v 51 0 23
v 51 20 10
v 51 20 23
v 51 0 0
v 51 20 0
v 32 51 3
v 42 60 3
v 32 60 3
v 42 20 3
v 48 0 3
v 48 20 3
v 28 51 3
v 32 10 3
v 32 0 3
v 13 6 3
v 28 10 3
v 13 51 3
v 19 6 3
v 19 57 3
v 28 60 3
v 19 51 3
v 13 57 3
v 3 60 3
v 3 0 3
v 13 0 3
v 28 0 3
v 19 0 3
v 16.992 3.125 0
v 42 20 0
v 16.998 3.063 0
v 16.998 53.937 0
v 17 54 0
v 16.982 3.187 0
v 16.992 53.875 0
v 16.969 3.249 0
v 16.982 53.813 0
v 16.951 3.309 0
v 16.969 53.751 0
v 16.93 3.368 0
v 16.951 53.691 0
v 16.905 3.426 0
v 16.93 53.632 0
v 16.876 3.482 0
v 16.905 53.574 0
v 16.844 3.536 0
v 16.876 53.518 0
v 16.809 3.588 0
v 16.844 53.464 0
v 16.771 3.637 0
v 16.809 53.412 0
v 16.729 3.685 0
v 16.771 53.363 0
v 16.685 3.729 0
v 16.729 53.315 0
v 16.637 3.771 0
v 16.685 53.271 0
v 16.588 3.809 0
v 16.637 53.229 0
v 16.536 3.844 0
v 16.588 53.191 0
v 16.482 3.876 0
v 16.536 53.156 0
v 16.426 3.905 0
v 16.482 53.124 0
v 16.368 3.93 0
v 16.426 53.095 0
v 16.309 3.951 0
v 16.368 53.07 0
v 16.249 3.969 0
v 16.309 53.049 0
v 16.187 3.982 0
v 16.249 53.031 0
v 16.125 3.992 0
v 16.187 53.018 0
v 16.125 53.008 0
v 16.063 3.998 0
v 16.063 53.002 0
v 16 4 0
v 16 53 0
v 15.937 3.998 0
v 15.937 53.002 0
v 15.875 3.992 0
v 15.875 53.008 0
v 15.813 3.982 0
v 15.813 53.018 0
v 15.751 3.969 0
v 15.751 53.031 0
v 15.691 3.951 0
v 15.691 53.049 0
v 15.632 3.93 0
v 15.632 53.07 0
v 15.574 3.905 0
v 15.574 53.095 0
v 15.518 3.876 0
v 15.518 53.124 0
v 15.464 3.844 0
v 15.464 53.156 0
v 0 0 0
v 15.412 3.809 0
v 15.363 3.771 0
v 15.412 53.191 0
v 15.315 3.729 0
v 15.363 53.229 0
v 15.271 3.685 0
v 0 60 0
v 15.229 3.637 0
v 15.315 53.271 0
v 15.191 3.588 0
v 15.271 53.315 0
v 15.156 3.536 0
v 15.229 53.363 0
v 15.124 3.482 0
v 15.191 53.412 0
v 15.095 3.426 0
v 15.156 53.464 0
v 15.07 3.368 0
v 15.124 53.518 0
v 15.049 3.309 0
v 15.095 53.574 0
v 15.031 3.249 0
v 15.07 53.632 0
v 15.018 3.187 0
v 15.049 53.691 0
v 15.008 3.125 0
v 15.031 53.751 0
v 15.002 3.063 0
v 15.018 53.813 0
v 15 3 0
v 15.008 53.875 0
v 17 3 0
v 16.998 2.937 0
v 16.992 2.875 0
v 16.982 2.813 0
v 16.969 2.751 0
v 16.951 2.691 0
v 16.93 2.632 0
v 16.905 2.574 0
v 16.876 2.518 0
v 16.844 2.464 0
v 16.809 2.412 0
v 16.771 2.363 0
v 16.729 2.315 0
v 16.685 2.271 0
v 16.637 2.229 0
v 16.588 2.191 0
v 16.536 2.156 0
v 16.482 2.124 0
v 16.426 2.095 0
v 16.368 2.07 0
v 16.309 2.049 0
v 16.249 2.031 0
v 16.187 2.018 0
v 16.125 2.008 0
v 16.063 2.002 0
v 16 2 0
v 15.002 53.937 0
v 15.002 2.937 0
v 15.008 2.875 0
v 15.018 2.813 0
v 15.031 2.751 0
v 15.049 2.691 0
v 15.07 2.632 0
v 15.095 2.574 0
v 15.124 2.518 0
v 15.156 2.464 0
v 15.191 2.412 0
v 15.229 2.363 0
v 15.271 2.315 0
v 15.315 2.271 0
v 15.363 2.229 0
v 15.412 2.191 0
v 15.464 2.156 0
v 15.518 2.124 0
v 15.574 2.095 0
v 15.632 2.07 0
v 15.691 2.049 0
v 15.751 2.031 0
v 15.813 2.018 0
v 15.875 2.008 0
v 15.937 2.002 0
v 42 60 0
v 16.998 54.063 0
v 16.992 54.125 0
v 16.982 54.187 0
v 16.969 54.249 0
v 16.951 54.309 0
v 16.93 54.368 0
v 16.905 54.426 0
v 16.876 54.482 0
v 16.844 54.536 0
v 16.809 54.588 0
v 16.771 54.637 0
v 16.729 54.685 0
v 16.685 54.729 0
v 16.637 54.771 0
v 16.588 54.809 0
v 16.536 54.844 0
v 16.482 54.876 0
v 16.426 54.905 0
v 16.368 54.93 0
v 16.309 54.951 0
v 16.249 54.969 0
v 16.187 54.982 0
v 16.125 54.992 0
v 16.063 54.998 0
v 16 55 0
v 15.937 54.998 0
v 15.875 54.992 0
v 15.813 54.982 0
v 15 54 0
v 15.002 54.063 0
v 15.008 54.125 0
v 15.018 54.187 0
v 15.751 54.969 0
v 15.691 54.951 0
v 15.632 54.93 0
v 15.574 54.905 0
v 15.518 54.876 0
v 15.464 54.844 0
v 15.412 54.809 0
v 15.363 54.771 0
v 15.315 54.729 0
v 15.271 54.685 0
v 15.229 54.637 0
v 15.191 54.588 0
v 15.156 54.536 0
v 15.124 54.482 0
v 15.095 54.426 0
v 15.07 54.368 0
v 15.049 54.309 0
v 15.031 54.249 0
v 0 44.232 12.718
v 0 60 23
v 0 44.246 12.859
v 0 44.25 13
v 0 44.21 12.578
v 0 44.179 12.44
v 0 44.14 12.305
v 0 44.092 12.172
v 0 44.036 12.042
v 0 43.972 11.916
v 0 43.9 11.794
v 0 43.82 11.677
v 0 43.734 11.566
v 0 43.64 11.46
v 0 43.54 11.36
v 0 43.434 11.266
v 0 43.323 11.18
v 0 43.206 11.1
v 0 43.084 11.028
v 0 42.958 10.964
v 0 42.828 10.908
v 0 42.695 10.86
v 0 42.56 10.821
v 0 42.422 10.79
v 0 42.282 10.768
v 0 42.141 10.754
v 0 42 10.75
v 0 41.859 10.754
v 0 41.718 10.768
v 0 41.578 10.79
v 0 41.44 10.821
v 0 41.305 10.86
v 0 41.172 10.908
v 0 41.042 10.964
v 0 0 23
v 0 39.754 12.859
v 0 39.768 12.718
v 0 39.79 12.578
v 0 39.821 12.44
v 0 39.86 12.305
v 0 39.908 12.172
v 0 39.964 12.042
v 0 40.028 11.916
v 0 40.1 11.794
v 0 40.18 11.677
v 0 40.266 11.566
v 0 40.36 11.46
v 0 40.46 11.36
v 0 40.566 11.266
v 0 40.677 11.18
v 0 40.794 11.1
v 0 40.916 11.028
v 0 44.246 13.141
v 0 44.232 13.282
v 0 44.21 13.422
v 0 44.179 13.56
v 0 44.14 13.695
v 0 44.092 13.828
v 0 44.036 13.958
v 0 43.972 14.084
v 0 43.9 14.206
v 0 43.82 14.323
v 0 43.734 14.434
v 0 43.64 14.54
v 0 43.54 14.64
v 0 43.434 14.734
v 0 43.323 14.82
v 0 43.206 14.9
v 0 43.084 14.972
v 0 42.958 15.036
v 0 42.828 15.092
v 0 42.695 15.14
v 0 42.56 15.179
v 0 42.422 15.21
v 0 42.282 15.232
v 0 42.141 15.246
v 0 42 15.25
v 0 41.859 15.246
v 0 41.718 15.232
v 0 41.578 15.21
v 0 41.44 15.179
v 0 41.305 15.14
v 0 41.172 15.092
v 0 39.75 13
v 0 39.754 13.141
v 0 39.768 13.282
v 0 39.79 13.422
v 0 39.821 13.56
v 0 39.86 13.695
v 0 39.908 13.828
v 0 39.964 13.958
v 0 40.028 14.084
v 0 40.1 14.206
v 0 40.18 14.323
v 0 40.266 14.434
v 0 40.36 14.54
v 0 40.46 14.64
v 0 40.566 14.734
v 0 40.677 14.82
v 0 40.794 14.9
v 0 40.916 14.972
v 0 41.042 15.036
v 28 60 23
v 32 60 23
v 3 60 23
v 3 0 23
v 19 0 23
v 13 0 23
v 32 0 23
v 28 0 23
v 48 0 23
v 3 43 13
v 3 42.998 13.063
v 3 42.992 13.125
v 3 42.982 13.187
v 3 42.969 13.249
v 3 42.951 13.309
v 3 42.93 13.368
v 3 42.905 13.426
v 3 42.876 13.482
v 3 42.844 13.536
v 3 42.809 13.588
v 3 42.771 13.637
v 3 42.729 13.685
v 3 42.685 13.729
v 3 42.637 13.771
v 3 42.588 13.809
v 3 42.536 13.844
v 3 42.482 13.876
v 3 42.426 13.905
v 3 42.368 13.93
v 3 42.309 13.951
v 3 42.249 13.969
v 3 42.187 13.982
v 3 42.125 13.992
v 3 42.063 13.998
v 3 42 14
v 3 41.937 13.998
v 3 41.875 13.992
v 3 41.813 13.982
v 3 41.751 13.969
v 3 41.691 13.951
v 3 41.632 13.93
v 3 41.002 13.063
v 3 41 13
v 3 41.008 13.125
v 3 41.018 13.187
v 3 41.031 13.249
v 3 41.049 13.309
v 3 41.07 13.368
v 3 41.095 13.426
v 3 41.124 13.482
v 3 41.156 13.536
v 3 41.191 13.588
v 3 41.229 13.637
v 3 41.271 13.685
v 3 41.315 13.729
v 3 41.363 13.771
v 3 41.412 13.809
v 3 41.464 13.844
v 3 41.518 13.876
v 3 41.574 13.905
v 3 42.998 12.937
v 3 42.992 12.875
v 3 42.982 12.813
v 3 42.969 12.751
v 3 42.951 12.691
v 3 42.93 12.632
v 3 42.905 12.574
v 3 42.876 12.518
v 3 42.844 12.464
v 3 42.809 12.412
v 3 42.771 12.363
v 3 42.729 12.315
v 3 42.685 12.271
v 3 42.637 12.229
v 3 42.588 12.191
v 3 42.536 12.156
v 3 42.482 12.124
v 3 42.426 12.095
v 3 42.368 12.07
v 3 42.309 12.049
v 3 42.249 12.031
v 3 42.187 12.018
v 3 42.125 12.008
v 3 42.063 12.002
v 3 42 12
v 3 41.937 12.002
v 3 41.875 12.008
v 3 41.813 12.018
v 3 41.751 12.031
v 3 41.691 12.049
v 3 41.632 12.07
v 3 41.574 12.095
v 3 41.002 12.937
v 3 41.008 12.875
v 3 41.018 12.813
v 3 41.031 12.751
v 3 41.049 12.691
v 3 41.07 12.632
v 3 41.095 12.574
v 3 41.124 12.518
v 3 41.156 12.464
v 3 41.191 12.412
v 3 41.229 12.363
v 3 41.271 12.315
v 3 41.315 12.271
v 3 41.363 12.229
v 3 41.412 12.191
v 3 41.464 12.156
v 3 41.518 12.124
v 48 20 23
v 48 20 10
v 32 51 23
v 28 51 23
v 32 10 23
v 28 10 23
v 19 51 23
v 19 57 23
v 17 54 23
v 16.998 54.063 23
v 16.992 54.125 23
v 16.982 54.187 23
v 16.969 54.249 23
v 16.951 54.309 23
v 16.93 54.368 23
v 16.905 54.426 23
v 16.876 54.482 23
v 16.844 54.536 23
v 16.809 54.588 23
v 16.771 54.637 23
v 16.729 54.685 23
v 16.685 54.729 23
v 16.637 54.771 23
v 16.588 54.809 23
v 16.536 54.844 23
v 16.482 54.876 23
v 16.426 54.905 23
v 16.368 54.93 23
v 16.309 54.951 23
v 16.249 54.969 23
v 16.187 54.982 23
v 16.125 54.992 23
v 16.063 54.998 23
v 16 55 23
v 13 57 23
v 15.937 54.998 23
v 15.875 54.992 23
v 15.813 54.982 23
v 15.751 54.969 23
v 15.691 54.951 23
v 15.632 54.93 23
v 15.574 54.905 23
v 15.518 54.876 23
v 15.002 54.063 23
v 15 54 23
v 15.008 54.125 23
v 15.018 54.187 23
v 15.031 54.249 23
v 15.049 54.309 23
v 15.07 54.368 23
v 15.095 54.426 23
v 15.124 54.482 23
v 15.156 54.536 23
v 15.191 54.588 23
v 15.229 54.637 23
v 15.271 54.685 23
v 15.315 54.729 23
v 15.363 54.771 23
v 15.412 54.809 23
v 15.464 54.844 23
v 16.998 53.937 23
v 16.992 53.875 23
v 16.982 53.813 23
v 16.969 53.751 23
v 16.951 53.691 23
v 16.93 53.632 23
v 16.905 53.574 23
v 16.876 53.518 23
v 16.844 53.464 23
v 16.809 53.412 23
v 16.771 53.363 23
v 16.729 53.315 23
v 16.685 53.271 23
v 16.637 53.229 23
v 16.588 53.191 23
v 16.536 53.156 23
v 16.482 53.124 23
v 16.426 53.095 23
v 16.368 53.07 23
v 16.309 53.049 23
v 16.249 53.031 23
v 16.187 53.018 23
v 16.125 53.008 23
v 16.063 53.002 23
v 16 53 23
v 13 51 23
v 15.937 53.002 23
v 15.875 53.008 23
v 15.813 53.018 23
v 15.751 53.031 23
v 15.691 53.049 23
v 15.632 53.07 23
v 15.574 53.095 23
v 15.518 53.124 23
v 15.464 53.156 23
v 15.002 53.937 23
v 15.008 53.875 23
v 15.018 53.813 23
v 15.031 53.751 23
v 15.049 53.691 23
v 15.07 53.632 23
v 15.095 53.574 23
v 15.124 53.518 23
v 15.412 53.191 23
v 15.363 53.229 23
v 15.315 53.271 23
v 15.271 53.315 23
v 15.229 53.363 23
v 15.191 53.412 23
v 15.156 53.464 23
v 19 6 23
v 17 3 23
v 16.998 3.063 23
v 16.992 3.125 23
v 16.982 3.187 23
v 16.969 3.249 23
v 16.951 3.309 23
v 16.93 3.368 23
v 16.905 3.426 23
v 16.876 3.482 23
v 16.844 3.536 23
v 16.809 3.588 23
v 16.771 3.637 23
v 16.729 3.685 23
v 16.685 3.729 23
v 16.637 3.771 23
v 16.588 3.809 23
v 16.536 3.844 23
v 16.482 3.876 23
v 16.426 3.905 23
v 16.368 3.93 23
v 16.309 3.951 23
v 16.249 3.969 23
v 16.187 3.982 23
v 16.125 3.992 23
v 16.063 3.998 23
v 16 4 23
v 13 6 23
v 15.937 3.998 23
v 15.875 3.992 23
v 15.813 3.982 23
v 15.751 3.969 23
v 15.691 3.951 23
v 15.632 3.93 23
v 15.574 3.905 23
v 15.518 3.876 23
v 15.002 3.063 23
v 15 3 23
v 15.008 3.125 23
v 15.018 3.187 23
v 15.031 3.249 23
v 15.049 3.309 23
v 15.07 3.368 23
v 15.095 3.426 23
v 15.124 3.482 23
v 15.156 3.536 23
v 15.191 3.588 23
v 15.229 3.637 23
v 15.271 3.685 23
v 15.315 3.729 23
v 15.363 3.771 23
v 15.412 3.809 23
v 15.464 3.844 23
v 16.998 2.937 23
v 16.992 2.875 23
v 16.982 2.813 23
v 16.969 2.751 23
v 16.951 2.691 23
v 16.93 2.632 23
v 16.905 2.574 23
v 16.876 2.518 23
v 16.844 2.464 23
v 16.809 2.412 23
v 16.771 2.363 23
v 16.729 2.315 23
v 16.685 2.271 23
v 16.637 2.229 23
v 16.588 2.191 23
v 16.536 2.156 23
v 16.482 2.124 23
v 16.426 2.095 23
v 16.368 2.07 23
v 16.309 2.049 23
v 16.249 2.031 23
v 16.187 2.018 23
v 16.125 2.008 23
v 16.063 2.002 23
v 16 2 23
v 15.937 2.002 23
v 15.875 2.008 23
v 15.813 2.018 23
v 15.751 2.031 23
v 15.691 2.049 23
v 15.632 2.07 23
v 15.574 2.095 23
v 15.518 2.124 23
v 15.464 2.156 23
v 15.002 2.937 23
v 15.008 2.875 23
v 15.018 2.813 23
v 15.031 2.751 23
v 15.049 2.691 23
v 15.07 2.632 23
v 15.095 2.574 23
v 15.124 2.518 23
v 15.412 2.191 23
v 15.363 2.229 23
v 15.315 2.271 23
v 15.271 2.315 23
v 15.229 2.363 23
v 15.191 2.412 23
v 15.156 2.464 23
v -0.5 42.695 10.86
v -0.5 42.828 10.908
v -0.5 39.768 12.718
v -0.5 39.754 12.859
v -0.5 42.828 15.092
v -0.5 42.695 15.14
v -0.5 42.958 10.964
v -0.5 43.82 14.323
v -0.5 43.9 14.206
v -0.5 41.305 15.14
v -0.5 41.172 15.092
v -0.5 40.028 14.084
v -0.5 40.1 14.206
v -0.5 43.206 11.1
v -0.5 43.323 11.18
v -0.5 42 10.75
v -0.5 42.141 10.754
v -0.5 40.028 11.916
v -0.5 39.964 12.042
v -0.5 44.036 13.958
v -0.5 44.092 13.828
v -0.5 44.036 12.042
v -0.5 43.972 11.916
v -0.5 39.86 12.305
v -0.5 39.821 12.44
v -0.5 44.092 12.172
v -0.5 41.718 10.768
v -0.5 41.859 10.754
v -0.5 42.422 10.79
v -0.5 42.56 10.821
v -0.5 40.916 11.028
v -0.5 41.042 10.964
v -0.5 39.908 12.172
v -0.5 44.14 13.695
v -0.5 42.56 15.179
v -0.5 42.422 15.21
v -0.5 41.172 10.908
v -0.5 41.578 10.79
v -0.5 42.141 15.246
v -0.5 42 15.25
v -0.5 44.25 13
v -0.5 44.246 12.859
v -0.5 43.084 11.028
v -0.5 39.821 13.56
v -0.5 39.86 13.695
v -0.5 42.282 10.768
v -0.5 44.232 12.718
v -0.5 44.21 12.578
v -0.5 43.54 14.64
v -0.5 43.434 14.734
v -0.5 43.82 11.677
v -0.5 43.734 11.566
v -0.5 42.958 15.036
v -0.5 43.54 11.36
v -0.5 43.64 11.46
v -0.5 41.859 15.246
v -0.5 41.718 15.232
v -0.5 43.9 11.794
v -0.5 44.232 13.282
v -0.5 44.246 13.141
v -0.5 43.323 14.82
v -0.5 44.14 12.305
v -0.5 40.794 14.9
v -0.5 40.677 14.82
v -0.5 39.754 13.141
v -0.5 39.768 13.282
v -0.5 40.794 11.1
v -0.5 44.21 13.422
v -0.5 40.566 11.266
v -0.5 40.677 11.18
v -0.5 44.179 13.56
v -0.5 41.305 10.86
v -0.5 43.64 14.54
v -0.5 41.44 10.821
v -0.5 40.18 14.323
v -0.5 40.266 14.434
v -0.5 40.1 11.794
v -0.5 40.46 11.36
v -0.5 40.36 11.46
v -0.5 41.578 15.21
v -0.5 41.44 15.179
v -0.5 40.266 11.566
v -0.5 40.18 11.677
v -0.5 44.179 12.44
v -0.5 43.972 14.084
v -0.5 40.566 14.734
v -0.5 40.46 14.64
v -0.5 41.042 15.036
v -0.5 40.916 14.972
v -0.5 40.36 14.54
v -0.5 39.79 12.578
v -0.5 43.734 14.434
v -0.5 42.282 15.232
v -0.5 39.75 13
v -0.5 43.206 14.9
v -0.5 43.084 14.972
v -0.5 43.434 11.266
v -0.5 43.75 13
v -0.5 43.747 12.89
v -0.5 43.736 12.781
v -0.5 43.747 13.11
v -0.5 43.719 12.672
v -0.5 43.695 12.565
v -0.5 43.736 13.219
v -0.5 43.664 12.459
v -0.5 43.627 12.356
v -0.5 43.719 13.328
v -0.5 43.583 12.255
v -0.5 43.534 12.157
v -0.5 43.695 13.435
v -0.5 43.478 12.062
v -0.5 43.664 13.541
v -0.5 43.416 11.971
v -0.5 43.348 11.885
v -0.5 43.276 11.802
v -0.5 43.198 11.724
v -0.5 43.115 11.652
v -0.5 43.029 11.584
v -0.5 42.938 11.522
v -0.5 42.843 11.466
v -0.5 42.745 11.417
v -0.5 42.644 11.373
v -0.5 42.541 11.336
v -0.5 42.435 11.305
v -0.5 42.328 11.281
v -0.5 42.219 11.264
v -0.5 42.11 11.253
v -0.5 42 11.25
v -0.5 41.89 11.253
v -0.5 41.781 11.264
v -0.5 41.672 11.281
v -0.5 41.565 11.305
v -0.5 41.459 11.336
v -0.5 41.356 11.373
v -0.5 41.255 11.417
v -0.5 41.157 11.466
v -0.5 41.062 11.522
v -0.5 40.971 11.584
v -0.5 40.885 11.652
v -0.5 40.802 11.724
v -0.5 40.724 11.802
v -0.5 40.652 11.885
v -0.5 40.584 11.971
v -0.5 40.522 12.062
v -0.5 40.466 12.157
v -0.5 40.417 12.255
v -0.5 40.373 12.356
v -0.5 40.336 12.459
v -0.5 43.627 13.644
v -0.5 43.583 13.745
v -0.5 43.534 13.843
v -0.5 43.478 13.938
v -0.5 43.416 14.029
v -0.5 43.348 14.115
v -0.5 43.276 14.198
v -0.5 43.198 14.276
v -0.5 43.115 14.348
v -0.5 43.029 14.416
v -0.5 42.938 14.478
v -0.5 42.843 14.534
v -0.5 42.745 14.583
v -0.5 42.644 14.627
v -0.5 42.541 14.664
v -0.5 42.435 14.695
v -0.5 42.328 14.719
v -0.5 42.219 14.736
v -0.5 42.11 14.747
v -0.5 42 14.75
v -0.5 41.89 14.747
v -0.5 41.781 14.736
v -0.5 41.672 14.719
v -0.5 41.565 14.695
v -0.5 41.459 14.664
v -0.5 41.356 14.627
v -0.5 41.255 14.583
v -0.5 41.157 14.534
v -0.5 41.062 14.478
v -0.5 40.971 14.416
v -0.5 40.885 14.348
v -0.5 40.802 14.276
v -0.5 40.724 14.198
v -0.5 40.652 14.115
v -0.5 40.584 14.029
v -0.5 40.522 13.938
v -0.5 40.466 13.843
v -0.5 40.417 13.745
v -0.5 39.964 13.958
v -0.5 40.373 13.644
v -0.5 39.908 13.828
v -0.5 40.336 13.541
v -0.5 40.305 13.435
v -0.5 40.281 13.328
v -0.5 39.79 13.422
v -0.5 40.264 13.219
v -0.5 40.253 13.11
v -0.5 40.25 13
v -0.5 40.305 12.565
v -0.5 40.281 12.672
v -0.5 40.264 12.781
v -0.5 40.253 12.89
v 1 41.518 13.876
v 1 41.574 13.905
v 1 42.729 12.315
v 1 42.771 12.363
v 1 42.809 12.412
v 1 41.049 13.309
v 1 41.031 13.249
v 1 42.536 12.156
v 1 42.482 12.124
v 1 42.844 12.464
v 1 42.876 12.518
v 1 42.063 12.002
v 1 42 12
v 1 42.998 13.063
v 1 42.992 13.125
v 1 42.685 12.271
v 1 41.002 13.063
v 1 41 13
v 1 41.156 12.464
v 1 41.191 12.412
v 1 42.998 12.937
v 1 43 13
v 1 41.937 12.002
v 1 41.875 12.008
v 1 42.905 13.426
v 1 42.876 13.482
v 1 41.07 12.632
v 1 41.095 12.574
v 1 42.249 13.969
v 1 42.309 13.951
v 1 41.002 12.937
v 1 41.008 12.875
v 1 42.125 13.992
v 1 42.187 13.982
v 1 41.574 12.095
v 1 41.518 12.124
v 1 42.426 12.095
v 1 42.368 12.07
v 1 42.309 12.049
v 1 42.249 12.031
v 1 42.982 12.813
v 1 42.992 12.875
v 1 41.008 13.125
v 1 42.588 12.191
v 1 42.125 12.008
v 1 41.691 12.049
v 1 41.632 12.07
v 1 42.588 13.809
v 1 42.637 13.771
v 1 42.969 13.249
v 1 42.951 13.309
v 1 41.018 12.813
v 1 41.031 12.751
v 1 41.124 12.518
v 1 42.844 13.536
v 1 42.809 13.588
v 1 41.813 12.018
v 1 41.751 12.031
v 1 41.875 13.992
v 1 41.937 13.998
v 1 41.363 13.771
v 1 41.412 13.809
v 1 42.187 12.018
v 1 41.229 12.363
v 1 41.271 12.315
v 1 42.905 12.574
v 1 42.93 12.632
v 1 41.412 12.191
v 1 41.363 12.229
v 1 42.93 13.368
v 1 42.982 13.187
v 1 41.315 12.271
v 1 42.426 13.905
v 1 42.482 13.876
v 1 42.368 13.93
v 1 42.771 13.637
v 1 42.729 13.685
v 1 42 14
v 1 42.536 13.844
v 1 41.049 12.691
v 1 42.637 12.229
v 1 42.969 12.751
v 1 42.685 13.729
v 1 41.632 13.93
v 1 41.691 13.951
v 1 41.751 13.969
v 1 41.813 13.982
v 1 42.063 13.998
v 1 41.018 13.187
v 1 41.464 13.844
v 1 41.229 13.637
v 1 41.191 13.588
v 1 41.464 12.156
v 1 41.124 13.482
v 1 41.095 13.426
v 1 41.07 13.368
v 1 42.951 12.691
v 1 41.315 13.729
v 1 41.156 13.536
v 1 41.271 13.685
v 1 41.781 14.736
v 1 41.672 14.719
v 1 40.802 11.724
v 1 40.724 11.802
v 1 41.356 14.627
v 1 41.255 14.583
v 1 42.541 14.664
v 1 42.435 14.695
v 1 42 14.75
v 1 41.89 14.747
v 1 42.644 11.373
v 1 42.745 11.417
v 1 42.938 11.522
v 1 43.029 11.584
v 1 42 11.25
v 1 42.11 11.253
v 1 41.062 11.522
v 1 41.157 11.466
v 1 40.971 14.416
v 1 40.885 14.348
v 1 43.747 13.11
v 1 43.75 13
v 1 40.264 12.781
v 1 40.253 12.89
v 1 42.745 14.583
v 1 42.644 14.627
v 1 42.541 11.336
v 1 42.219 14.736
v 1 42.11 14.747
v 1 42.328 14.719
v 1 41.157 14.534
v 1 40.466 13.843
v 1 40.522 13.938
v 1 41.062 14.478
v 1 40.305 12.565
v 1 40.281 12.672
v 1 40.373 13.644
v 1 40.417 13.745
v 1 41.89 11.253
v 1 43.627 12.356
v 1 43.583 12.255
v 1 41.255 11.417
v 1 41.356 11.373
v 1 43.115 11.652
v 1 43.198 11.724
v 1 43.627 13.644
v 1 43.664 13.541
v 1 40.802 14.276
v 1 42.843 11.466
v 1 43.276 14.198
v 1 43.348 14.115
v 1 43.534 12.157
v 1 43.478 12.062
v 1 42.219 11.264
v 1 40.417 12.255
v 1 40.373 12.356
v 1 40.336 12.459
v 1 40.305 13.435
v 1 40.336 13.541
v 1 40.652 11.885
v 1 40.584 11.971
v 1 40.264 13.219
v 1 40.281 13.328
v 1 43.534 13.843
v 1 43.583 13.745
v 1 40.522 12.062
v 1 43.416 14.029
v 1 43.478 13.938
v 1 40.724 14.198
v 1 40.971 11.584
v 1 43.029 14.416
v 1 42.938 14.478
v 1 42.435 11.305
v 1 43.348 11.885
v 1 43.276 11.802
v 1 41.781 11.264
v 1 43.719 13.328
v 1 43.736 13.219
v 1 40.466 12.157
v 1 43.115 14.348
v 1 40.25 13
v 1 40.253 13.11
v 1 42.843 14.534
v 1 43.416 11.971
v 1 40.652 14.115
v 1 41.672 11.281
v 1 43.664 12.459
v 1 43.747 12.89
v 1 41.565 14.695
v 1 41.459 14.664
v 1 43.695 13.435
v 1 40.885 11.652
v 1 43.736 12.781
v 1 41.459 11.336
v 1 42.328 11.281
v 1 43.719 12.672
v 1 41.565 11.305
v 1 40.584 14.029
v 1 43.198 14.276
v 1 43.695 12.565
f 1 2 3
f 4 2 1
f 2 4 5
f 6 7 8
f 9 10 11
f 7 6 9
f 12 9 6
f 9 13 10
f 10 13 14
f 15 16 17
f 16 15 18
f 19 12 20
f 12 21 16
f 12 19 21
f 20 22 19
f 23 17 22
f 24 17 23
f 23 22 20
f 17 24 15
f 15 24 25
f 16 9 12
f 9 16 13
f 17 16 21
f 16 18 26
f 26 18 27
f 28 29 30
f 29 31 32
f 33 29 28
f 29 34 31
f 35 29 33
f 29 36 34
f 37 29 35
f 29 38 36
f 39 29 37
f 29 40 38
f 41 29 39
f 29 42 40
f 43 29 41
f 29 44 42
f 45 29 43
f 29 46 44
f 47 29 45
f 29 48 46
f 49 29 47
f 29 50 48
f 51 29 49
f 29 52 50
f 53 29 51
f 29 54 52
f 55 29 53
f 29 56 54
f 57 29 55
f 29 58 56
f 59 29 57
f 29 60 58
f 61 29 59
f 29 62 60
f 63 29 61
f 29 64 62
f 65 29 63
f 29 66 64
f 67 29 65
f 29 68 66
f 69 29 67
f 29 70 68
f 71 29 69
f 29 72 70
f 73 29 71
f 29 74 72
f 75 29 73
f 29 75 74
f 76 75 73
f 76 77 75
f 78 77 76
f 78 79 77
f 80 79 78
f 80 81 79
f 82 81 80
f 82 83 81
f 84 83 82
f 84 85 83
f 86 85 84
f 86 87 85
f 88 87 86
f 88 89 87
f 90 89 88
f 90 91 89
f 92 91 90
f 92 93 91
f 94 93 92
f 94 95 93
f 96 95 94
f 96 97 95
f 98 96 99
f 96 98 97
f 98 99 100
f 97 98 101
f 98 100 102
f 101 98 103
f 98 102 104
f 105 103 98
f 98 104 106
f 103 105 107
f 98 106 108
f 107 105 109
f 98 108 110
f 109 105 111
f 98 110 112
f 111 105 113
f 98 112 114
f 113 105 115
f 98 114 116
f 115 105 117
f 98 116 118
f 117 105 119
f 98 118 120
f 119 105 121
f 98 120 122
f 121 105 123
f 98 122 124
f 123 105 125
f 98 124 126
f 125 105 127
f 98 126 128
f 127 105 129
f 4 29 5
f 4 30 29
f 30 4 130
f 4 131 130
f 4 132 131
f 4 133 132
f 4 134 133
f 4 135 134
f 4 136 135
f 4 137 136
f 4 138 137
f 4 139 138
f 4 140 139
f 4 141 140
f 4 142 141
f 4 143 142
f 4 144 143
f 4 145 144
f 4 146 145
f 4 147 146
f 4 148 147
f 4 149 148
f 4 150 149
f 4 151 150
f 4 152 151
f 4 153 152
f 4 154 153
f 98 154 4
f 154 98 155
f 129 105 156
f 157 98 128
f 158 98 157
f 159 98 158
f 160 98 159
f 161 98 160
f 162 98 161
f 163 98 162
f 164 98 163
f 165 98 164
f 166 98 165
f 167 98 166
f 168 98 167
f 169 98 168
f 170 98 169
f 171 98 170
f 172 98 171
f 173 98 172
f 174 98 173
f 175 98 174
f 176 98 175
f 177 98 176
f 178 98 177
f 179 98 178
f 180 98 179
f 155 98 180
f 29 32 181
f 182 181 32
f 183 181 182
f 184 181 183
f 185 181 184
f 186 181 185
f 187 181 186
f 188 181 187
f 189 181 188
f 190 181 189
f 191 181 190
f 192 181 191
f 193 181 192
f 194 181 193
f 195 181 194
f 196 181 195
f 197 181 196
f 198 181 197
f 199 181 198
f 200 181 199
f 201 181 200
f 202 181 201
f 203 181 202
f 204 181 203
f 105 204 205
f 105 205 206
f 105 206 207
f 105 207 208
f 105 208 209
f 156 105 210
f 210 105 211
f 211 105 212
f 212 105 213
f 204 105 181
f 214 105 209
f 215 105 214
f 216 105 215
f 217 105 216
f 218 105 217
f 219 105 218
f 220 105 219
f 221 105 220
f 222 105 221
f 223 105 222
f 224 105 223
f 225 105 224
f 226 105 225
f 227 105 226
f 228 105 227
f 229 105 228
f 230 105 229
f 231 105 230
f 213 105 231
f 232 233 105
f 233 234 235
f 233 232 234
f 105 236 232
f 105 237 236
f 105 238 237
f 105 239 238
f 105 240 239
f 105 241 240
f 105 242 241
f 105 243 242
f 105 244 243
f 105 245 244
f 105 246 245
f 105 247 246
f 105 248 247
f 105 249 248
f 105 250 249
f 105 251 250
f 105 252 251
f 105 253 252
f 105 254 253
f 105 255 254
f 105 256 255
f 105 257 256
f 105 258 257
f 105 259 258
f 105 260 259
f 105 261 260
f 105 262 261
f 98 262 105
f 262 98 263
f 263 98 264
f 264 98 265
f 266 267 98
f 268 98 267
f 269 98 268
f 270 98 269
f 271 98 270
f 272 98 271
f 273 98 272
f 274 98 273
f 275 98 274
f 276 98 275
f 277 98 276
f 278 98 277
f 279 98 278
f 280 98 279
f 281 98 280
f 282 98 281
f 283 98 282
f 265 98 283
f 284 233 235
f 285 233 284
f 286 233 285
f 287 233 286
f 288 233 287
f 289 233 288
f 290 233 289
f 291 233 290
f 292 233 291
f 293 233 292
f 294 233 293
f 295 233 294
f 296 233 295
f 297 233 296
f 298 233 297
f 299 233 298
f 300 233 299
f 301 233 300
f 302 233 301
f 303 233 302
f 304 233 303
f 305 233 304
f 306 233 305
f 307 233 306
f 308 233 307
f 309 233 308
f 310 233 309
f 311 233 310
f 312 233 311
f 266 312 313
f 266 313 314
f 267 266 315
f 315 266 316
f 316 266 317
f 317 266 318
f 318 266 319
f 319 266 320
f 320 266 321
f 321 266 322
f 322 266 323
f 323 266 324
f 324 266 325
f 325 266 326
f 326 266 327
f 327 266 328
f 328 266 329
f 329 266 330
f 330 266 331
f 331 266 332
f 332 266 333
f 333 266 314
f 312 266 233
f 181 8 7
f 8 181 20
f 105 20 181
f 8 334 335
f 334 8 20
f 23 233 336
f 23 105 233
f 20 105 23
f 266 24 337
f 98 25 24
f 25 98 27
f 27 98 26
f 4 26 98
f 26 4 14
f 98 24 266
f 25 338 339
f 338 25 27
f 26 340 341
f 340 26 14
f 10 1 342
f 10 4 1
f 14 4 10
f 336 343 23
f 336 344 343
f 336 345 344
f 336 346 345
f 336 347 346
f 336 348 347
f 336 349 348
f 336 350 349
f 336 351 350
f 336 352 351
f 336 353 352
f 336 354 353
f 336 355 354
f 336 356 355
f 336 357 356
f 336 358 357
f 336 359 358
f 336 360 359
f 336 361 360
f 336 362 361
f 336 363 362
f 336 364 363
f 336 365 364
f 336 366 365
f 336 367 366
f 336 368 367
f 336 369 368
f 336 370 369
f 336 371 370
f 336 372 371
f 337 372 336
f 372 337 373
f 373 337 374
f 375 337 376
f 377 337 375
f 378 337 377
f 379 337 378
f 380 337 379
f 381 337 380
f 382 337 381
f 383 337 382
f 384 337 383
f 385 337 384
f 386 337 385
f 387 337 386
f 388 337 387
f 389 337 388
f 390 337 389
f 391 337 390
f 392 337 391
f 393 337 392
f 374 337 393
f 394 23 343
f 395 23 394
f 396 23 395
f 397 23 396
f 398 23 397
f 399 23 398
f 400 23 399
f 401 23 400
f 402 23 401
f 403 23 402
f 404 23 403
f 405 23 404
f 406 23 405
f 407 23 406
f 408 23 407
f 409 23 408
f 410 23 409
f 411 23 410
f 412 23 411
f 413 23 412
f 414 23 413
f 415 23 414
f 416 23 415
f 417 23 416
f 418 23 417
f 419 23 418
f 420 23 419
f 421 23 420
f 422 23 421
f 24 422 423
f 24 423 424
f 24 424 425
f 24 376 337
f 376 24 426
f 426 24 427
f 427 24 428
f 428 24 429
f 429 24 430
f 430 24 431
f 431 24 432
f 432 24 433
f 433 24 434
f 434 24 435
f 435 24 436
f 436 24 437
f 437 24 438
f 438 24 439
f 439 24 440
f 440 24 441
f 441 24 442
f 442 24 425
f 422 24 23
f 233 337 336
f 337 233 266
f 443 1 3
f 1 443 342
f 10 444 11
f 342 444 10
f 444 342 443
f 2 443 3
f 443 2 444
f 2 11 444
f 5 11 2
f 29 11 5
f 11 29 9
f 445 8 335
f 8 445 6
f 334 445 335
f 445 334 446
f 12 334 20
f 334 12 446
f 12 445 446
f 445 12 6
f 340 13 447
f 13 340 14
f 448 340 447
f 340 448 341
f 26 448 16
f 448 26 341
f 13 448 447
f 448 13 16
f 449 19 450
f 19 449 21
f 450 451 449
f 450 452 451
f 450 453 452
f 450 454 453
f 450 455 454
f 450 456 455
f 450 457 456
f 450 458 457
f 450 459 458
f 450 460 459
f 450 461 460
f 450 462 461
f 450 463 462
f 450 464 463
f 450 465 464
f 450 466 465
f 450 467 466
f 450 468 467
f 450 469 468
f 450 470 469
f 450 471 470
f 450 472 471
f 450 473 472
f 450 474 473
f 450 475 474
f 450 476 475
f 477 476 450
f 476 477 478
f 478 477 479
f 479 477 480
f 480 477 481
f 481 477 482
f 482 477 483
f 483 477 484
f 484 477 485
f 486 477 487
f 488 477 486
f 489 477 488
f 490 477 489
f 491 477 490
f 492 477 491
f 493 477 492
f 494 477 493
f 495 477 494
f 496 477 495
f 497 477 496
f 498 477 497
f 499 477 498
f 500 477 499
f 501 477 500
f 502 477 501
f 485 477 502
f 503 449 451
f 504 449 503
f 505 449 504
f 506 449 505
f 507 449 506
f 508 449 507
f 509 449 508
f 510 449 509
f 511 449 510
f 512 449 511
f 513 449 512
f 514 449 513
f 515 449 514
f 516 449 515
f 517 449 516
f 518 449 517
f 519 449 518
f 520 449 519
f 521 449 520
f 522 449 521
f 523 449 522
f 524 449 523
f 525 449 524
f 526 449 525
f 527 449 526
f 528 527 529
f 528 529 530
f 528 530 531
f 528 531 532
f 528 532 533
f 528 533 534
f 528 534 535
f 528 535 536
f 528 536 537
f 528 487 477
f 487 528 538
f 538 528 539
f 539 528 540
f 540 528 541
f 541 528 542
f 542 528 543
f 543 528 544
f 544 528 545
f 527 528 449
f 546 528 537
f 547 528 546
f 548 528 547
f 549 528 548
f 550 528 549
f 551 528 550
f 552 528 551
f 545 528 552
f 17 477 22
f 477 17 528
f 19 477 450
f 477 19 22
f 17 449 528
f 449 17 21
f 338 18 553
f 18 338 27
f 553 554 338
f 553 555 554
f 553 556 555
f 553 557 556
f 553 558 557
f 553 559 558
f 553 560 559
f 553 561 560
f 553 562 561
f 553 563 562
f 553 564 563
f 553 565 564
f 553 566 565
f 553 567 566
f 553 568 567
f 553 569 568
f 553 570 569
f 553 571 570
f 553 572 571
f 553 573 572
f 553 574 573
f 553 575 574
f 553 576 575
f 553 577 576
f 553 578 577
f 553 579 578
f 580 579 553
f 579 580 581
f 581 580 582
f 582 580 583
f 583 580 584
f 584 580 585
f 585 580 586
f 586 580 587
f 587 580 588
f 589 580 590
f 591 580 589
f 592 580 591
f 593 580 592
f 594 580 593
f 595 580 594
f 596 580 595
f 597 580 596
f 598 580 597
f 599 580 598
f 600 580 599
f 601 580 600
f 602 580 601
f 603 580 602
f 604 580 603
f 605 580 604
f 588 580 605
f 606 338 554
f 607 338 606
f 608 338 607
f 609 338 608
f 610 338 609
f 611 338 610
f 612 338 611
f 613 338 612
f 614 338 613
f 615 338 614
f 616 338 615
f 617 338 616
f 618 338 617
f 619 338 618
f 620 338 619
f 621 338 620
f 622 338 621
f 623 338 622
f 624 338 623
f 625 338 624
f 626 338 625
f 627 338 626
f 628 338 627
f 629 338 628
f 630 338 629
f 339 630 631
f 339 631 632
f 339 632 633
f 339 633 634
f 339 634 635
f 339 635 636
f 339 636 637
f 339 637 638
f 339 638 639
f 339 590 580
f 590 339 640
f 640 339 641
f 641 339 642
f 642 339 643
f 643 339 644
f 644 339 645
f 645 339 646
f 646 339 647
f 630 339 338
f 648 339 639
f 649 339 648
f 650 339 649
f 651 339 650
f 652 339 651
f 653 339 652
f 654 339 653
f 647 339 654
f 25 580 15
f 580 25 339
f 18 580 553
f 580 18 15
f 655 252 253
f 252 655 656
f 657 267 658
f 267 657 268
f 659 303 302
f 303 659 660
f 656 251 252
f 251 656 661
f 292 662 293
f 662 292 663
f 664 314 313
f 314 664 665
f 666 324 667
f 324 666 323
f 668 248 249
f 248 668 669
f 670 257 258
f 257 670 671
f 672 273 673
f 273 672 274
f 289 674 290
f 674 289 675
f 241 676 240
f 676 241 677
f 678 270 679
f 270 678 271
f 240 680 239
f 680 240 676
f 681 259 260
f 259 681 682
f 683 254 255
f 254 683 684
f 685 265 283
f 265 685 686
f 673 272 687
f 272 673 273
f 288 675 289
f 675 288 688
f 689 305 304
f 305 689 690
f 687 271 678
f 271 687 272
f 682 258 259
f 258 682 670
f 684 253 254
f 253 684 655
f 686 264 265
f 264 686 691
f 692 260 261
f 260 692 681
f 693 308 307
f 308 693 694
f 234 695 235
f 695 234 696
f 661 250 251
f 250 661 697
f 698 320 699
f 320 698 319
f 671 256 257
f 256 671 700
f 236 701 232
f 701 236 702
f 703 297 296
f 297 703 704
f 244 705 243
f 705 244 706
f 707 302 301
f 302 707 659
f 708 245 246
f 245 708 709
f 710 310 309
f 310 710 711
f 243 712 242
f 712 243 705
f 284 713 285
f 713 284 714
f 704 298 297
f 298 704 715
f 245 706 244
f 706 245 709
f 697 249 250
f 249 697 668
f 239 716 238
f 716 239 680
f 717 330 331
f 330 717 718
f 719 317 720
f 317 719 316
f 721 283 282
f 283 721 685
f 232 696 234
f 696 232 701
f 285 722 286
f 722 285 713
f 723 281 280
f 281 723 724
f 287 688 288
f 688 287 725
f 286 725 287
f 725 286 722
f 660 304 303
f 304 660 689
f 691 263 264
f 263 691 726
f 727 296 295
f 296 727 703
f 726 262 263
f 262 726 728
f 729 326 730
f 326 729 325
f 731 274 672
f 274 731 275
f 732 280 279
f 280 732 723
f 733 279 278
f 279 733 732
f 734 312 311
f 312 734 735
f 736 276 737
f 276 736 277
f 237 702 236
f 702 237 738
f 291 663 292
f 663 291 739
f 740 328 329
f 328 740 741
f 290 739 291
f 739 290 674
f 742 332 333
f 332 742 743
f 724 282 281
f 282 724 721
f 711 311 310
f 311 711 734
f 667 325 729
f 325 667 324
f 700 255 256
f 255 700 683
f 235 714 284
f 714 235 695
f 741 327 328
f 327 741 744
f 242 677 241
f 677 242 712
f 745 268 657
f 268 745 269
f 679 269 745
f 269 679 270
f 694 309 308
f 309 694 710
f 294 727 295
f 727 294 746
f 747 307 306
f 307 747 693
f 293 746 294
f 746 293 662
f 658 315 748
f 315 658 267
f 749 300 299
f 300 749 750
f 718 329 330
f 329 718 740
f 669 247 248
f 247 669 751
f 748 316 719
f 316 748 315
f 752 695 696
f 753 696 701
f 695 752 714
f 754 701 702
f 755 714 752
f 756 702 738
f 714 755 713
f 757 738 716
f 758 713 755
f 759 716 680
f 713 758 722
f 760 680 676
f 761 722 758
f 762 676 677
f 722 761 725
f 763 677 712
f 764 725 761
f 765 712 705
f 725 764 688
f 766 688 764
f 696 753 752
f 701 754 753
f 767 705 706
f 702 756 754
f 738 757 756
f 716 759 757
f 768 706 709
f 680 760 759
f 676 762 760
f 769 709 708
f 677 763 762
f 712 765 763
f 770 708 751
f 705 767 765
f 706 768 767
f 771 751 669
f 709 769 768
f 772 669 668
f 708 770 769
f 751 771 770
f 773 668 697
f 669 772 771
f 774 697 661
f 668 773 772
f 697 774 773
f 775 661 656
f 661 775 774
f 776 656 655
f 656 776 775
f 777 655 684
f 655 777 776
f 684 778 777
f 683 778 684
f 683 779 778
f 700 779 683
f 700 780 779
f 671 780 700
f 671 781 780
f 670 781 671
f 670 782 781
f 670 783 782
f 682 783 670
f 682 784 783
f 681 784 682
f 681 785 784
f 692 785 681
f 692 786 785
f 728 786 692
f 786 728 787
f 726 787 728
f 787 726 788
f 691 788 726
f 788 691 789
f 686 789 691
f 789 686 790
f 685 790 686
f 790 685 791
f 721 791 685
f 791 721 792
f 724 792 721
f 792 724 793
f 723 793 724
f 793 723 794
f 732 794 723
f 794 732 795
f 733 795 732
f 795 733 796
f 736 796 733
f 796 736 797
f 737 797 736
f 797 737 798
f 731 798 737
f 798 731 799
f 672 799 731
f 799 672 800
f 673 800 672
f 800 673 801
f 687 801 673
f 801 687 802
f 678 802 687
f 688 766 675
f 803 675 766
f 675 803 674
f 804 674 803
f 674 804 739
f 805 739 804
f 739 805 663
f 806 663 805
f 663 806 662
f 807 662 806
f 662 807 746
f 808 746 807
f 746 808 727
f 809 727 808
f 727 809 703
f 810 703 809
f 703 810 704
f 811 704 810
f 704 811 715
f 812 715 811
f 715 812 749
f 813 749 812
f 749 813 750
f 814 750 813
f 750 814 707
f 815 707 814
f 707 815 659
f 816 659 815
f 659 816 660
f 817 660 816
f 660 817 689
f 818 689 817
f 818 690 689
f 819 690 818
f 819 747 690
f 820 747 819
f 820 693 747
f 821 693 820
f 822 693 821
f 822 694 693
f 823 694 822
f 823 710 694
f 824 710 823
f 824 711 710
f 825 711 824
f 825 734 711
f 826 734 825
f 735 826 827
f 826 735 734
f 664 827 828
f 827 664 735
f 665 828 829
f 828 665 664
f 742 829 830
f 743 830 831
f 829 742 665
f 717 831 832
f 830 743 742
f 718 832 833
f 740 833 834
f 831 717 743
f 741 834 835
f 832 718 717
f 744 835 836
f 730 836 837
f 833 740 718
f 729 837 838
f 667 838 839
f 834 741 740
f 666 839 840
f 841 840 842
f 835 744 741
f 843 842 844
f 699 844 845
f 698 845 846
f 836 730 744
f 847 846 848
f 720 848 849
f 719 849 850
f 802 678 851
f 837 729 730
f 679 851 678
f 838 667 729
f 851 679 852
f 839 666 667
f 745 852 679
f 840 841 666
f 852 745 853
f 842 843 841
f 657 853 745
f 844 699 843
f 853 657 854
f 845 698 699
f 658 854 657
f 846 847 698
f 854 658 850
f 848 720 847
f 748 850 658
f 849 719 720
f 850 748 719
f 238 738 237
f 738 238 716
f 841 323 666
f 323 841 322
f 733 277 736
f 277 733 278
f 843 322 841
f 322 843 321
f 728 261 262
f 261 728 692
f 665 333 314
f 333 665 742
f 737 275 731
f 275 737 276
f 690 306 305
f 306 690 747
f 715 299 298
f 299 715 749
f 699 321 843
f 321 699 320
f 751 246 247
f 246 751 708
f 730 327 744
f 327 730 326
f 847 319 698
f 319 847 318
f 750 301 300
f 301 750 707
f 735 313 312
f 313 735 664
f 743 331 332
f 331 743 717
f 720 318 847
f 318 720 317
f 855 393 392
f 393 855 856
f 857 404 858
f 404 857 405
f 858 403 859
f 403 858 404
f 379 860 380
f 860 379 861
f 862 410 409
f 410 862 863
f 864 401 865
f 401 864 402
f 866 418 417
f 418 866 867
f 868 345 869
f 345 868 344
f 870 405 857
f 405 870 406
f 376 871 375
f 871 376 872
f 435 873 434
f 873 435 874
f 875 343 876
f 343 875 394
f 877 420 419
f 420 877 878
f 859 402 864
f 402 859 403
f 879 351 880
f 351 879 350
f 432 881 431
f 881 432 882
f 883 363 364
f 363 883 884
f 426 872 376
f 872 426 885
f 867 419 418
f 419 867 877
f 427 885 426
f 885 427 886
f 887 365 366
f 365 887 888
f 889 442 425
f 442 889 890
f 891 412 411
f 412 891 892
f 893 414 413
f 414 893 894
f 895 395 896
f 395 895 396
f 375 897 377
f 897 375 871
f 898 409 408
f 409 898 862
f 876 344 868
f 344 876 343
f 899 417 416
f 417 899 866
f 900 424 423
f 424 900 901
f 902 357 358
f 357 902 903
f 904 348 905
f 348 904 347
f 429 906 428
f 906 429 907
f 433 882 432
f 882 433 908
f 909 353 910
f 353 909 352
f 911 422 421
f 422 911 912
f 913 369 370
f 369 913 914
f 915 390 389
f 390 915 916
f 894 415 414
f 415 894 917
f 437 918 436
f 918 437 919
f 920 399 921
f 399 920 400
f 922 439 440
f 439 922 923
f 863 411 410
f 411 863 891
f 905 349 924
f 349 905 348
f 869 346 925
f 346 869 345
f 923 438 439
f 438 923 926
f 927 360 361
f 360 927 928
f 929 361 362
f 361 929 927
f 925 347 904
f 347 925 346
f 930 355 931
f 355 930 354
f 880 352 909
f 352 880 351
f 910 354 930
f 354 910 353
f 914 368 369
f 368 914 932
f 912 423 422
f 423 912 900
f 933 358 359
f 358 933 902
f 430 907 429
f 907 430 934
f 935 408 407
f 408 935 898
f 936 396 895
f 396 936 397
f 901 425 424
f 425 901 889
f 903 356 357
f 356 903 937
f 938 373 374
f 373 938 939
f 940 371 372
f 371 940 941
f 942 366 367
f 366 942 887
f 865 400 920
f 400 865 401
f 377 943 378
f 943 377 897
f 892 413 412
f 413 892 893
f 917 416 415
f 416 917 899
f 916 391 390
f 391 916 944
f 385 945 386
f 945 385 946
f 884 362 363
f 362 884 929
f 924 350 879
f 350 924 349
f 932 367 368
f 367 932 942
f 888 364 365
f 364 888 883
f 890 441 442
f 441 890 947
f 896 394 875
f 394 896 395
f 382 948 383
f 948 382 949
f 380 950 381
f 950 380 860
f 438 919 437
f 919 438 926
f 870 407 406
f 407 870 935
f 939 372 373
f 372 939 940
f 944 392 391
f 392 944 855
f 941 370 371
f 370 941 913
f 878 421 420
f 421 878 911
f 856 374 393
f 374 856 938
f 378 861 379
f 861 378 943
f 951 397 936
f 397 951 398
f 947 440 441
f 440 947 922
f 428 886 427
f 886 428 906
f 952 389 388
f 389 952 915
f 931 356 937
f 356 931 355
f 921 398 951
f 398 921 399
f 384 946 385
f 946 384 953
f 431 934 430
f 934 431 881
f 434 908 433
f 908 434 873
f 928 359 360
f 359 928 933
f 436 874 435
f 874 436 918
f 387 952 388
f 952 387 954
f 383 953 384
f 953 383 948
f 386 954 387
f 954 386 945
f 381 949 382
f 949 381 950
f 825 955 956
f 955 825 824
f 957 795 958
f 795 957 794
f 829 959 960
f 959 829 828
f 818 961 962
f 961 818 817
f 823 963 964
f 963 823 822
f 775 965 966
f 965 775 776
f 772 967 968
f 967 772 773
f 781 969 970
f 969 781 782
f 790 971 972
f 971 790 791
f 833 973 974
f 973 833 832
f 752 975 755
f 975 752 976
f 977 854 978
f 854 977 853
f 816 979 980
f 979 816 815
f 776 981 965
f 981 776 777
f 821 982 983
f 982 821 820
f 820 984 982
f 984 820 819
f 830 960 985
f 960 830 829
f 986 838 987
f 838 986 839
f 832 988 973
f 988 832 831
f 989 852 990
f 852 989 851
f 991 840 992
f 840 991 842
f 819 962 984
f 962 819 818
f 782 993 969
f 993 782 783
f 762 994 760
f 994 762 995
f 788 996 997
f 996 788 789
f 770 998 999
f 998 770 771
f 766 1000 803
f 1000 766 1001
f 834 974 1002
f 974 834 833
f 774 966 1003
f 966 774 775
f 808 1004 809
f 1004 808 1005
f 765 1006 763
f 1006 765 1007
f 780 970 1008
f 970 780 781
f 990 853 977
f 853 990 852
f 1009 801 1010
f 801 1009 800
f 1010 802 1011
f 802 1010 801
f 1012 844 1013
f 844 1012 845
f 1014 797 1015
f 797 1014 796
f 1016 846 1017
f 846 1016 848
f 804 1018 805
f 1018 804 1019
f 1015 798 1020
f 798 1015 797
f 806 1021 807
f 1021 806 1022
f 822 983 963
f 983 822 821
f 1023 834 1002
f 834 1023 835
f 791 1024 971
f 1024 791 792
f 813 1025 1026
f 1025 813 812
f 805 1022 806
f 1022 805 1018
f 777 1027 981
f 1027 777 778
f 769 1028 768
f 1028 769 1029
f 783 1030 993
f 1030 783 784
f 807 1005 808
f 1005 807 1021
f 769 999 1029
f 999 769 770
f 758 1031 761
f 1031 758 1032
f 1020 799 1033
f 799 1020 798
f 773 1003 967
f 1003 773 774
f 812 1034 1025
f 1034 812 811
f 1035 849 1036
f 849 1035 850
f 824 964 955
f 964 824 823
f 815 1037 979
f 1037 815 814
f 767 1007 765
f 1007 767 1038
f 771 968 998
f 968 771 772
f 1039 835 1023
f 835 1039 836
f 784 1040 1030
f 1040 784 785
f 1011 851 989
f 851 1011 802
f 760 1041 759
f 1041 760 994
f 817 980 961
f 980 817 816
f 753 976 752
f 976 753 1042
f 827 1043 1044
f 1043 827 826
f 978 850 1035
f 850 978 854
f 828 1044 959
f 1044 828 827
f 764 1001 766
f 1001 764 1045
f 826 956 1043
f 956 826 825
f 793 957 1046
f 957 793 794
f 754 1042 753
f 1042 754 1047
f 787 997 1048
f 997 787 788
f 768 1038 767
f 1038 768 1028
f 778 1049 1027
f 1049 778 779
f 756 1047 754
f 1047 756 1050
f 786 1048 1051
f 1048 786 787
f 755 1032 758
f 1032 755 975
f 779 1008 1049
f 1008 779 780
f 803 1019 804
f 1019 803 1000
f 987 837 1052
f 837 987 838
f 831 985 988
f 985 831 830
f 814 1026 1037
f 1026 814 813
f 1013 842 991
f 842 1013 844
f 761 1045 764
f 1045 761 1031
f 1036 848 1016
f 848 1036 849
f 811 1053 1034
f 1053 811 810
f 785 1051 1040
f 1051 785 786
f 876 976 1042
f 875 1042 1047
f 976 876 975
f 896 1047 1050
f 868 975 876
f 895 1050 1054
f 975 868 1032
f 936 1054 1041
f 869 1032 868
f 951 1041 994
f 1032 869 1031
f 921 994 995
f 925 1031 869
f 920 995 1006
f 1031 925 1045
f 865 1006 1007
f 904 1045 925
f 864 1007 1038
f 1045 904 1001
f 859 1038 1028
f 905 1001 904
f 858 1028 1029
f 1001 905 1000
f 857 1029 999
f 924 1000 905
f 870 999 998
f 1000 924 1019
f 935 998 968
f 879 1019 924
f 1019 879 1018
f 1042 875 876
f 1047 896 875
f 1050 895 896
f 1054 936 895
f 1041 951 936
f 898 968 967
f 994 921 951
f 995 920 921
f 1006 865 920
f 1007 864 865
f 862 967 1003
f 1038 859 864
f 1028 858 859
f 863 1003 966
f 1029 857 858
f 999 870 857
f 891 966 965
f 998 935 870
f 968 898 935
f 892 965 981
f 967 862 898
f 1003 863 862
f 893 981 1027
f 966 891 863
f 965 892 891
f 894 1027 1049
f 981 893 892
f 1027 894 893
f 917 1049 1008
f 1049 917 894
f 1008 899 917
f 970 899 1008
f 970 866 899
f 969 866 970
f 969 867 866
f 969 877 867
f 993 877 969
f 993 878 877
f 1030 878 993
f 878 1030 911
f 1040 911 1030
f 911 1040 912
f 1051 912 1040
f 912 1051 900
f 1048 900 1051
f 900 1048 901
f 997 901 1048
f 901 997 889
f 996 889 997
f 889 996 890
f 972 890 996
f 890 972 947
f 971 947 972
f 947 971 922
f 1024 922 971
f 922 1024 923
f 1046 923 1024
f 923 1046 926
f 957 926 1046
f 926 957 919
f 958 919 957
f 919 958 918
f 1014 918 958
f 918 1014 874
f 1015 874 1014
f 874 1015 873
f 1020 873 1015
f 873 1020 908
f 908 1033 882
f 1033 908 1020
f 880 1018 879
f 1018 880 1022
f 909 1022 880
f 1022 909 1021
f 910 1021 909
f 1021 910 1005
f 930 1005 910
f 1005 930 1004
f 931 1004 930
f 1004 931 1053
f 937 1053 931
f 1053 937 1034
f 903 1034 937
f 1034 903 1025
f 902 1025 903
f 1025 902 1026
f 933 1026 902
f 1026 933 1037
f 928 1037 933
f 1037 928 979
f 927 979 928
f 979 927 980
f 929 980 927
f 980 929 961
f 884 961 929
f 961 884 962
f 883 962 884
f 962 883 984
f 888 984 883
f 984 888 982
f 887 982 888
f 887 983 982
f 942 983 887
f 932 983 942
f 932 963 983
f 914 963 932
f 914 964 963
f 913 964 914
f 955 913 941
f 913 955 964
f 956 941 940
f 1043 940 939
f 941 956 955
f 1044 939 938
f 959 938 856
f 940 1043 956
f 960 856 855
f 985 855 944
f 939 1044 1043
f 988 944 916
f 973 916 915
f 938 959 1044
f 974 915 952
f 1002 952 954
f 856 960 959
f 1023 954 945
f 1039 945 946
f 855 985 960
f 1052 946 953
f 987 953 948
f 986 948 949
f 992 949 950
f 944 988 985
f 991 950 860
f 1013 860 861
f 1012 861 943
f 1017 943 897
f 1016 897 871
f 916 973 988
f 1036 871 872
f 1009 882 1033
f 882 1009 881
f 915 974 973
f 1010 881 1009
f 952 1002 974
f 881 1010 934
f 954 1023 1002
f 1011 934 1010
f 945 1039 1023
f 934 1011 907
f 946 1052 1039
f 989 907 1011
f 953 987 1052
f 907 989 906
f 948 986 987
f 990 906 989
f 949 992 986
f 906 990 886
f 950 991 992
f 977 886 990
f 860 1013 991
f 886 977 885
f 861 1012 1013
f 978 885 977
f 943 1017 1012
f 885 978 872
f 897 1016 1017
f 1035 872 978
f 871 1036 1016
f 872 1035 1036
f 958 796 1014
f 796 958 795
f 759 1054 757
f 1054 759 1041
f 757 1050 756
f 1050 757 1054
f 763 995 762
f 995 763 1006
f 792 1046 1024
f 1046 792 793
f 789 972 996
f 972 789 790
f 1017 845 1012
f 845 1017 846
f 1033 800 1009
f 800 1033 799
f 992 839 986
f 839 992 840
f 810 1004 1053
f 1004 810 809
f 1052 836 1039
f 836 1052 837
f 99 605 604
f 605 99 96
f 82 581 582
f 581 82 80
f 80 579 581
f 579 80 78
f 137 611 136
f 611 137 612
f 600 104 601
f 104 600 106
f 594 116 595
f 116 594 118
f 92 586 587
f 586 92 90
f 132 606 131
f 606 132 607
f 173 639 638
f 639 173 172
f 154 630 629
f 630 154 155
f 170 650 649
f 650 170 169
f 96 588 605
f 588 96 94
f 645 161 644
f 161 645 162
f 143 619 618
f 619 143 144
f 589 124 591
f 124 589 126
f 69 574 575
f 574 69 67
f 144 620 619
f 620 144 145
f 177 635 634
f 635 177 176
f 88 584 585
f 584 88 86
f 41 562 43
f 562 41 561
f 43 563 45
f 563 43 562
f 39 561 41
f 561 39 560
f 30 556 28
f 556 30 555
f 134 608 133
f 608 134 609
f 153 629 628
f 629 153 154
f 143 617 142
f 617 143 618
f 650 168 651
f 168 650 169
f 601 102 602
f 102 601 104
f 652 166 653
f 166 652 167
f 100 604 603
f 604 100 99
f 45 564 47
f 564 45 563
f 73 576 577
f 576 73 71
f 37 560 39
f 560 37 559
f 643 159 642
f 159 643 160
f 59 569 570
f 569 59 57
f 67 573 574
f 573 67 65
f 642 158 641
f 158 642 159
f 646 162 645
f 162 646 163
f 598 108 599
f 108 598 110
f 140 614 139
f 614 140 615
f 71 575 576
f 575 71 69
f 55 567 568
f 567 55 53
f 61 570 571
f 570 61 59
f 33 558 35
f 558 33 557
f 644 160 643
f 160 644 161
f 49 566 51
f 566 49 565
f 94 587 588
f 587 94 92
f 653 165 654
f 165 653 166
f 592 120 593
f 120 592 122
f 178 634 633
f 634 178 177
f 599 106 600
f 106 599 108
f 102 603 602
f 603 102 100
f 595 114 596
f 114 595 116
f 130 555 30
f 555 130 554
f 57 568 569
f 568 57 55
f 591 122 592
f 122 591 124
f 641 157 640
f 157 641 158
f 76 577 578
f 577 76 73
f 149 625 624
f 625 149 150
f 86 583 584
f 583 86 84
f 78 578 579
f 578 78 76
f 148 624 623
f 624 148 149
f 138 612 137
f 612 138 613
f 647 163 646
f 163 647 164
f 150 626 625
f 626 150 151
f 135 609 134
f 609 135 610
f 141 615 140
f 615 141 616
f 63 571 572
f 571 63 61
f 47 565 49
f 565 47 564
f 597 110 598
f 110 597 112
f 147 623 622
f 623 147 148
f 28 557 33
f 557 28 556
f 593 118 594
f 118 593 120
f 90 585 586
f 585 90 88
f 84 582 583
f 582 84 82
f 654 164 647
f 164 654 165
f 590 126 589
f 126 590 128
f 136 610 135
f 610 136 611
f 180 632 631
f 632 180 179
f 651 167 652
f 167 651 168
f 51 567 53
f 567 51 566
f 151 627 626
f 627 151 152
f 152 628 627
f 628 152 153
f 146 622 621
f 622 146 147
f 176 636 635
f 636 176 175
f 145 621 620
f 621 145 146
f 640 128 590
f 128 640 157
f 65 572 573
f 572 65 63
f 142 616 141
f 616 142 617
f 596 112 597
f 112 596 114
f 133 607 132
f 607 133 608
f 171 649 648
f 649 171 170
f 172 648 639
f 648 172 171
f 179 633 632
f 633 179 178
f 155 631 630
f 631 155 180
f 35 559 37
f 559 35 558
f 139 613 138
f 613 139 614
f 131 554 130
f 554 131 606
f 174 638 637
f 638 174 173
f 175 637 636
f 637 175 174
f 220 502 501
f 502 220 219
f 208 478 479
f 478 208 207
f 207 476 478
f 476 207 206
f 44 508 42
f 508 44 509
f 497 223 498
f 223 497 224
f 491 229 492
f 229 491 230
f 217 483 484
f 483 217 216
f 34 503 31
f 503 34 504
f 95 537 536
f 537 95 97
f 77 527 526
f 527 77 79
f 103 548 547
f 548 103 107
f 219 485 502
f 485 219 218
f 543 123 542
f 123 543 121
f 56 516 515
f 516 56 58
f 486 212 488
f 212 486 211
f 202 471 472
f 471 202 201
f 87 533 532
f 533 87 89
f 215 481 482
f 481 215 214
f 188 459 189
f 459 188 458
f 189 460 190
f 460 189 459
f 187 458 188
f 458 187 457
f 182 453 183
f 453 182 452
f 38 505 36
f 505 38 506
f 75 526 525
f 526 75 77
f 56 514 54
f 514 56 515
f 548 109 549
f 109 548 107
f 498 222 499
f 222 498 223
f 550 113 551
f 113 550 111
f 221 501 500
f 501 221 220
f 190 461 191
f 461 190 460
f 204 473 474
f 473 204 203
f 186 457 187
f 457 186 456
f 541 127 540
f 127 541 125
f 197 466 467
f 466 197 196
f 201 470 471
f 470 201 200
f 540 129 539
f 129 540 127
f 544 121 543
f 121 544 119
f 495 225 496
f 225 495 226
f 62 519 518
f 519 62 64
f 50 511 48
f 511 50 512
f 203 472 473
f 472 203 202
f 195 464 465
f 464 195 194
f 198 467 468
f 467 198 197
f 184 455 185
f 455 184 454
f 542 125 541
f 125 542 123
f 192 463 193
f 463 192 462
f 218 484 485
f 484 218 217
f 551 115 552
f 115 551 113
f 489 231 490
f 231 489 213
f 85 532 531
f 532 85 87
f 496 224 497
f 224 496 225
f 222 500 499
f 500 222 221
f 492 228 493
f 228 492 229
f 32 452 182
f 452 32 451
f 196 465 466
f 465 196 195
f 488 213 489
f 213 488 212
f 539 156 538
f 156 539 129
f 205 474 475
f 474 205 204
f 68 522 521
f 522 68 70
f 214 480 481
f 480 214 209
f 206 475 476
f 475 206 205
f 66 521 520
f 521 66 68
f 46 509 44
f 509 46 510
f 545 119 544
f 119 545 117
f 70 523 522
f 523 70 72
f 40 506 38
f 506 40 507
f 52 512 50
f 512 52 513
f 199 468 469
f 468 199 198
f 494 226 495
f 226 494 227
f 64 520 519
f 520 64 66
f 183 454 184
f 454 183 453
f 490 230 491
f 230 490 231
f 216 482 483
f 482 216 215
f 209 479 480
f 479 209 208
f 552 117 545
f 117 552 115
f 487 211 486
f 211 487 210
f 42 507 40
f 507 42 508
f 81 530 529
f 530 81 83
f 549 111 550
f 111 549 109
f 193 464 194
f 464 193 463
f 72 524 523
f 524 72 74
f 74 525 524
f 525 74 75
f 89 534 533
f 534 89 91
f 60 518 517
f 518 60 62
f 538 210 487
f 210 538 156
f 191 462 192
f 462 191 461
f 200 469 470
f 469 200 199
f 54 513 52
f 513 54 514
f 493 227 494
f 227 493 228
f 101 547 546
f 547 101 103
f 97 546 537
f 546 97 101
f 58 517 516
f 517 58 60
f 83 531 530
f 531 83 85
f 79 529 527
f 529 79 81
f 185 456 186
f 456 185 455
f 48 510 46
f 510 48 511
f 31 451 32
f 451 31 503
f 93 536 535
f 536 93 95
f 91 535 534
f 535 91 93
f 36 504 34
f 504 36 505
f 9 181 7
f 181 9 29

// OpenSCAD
difference(){

	union(){
        // testplaat
        translate([3,10,0]){
           //cube([29,41,5], center=false);
        }


        // onderplaat
        translate([0,0,0]){
           cube([51,60,3], center=false);
        }
        
        // linkerkant
        translate([0,0,0]){
          cube([3,60,23], center=false);
        }      
        // rechterkant
        translate([51-3,0,0]){
         cube([3,20,23], center=false);
        }      
        
        // steun rechtsvoor
        translate([28,51,0]){
          cube([4,9,23], center=false);
        }      
        // steun rechtsachter
        translate([28,0,0]){
          cube([4,10,23], center=false);
        }      
        // steun linksvoor
        translate([13,41+10,0]){
          cube([6,6,23], center=false);
        }      
        // steun linksachter
        translate([13,0,0]){
          cube([6,6,23], center=false);
        }      
        
        translate([0,51-9,13]){
            rotate(a = [0,90,0]) {
                cylinder(h=1, r=2.25, $fn=100, center=true);
            }
        }			   
        
	}
	union() {
        // gat in zijkanten (9.1mm)
       translate([0,51-9,13]){
            rotate(a = [0,90,0]) {
                cylinder(h=600, r=1, $fn=100, center=true);
            }
       }			   

        // gat in ring
        translate([0,51-9,13]){
            rotate(a = [0,90,0]) {
                cylinder(h=2, r=1.75, $fn=100, center=true);
            }
        }			   
       
       
       // gat in steun rechtsachter
       translate([16,3,0]){
            rotate(a = [0,0,90]) {
                cylinder(h=600, r=1, $fn=100, center=true);
            }
       }			   
       // gat in steun rechtsvoor
       translate([16,54,0]){
            rotate(a = [0,0,90]) {
                cylinder(h=600, r=1, $fn=100, center=true);
            }
       }	
       // uitsparing vloer
        translate([42,20,-10]){
          cube([20,50,20], center=false);
        }      

        
	}
}
